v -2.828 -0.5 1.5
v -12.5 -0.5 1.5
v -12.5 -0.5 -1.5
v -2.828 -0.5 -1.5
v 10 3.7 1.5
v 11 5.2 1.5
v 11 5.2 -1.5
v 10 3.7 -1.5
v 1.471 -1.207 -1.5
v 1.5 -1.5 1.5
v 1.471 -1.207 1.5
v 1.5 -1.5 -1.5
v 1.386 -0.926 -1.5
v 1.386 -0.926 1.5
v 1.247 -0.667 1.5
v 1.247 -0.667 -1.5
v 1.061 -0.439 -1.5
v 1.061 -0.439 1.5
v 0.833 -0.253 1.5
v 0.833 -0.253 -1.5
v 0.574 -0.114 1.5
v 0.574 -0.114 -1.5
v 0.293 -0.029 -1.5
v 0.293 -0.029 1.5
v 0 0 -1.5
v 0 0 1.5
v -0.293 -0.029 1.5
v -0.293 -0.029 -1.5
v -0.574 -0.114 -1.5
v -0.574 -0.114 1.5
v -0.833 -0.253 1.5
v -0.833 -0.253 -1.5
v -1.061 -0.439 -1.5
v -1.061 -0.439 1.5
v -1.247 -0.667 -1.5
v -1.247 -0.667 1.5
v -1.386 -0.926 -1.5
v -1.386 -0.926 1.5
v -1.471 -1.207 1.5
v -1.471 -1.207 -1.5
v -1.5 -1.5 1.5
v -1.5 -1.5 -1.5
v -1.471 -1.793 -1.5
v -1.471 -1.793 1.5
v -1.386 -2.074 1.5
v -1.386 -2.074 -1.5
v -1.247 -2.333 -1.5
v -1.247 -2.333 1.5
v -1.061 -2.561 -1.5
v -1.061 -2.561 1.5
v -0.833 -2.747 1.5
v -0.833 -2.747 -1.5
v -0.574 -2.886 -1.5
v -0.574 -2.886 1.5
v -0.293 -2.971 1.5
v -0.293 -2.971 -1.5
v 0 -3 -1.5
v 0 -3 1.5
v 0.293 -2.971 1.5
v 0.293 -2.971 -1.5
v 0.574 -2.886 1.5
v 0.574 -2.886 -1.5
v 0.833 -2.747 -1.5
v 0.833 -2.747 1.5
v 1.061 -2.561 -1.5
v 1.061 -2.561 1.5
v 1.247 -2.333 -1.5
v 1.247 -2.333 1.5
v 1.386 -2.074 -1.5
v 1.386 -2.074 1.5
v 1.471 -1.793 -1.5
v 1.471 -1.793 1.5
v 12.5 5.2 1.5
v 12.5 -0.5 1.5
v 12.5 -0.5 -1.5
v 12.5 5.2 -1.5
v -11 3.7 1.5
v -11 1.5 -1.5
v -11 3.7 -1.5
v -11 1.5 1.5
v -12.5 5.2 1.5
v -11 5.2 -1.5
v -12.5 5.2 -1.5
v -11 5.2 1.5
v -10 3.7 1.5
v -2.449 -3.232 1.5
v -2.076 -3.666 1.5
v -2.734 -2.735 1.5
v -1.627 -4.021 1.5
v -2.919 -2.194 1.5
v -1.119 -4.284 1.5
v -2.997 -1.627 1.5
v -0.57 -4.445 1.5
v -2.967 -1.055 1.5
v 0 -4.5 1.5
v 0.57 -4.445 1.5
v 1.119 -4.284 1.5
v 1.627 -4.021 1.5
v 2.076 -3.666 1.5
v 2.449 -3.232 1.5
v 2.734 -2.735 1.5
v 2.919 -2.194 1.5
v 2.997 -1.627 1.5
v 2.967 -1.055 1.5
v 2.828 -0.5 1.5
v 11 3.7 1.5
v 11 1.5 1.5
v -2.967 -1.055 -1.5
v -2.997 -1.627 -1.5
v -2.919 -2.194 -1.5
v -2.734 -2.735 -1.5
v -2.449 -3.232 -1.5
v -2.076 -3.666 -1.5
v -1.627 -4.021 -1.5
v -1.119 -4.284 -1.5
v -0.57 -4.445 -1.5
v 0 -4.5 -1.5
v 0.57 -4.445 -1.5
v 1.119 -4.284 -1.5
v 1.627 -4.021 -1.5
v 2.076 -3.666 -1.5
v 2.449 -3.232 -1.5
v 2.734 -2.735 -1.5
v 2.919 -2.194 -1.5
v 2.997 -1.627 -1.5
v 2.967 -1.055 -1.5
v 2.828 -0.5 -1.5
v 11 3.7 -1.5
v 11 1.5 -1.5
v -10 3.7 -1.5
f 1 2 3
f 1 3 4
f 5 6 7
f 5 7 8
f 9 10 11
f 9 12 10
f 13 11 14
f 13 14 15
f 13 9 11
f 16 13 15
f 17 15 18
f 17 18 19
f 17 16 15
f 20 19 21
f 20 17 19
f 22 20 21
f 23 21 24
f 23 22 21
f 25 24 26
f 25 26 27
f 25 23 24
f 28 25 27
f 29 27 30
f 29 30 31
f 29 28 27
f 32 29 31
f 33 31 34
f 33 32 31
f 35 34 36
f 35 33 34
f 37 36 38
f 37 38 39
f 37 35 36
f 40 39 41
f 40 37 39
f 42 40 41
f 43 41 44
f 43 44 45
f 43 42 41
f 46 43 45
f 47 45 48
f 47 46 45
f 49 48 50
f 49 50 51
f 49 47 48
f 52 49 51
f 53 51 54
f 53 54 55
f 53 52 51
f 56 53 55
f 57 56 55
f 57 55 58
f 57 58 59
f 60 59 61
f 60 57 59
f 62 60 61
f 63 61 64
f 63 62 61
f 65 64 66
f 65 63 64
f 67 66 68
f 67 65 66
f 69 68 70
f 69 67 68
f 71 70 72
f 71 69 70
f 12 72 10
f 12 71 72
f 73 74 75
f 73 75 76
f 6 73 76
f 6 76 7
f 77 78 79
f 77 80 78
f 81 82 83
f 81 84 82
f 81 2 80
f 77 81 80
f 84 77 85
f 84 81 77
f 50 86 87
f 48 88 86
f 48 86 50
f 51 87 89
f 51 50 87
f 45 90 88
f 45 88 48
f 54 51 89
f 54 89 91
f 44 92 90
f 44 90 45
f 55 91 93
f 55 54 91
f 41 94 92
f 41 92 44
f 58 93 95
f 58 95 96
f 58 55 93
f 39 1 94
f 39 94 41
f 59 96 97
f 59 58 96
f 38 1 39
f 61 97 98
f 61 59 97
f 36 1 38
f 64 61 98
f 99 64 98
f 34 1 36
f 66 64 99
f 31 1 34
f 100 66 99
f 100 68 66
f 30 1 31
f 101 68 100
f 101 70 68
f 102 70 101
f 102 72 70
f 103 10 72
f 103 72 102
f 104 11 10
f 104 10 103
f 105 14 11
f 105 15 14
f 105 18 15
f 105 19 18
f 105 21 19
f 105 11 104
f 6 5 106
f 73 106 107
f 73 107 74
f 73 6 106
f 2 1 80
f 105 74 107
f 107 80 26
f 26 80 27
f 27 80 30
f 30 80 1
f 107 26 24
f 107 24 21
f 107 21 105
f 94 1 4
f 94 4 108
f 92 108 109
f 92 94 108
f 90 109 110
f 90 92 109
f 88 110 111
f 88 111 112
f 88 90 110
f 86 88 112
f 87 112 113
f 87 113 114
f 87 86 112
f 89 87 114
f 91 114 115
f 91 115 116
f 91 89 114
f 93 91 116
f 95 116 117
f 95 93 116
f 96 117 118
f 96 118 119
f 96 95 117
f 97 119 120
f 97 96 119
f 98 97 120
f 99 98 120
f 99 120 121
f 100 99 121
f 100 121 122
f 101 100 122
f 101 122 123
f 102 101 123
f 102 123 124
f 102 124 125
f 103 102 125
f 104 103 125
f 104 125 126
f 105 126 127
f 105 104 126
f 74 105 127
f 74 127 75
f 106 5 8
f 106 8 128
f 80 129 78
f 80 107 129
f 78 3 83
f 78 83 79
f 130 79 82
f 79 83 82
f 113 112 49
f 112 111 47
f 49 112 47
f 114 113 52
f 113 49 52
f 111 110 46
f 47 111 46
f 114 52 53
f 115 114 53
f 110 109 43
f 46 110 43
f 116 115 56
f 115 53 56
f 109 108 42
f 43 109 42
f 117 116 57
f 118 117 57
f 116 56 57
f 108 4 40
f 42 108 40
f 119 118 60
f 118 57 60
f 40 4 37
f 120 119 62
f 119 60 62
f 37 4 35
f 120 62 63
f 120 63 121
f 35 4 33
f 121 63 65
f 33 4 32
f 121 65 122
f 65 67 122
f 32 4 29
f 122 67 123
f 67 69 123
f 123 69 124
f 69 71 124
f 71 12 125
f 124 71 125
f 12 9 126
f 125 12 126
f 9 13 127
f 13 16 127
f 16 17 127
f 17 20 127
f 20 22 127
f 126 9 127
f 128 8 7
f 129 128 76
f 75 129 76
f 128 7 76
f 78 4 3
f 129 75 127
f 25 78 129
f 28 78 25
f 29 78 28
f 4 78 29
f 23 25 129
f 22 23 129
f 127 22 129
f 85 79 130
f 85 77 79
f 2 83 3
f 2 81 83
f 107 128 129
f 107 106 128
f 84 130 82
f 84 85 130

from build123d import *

# Parameters (mm, degrees)
SKIZZE1_R                       = 1.5
AUFSATZ_LINEAR_AUSTRAGEN1_DEPTH = 1.5


with BuildPart() as part:
    # Skizze1 → Aufsatz-Linear austragen1 (new body, symmetric)
    with BuildSketch(Plane.XY):
        with BuildLine():
            Line((-12.5, 5.2), (-12.5, -0.5))
            Line((-12.5, -0.5), (-2.828427125, -0.5))
            ThreePointArc((-2.828427125, -0.5), (0, -4.5), (2.828427125, -0.5))
            Line((2.828427125, -0.5), (12.5, -0.5))
            Line((12.5, -0.5), (12.5, 5.2))
            Line((12.5, 5.2), (11, 5.2))
            Line((11, 5.2), (10, 3.7))
            Line((10, 3.7), (11, 3.7))
            Line((11, 3.7), (11, 1.5))
            Line((11, 1.5), (-11, 1.5))
            Line((-11, 1.5), (-11, 3.7))
            Line((-11, 3.7), (-10, 3.7))
            Line((-10, 3.7), (-11, 5.2))
            Line((-11, 5.2), (-12.5, 5.2))
        make_face()
        with Locations((0, -1.5)):
            Circle(SKIZZE1_R, mode=Mode.SUBTRACT)
    extrude(amount=AUFSATZ_LINEAR_AUSTRAGEN1_DEPTH, both=True)


solid = part.part
